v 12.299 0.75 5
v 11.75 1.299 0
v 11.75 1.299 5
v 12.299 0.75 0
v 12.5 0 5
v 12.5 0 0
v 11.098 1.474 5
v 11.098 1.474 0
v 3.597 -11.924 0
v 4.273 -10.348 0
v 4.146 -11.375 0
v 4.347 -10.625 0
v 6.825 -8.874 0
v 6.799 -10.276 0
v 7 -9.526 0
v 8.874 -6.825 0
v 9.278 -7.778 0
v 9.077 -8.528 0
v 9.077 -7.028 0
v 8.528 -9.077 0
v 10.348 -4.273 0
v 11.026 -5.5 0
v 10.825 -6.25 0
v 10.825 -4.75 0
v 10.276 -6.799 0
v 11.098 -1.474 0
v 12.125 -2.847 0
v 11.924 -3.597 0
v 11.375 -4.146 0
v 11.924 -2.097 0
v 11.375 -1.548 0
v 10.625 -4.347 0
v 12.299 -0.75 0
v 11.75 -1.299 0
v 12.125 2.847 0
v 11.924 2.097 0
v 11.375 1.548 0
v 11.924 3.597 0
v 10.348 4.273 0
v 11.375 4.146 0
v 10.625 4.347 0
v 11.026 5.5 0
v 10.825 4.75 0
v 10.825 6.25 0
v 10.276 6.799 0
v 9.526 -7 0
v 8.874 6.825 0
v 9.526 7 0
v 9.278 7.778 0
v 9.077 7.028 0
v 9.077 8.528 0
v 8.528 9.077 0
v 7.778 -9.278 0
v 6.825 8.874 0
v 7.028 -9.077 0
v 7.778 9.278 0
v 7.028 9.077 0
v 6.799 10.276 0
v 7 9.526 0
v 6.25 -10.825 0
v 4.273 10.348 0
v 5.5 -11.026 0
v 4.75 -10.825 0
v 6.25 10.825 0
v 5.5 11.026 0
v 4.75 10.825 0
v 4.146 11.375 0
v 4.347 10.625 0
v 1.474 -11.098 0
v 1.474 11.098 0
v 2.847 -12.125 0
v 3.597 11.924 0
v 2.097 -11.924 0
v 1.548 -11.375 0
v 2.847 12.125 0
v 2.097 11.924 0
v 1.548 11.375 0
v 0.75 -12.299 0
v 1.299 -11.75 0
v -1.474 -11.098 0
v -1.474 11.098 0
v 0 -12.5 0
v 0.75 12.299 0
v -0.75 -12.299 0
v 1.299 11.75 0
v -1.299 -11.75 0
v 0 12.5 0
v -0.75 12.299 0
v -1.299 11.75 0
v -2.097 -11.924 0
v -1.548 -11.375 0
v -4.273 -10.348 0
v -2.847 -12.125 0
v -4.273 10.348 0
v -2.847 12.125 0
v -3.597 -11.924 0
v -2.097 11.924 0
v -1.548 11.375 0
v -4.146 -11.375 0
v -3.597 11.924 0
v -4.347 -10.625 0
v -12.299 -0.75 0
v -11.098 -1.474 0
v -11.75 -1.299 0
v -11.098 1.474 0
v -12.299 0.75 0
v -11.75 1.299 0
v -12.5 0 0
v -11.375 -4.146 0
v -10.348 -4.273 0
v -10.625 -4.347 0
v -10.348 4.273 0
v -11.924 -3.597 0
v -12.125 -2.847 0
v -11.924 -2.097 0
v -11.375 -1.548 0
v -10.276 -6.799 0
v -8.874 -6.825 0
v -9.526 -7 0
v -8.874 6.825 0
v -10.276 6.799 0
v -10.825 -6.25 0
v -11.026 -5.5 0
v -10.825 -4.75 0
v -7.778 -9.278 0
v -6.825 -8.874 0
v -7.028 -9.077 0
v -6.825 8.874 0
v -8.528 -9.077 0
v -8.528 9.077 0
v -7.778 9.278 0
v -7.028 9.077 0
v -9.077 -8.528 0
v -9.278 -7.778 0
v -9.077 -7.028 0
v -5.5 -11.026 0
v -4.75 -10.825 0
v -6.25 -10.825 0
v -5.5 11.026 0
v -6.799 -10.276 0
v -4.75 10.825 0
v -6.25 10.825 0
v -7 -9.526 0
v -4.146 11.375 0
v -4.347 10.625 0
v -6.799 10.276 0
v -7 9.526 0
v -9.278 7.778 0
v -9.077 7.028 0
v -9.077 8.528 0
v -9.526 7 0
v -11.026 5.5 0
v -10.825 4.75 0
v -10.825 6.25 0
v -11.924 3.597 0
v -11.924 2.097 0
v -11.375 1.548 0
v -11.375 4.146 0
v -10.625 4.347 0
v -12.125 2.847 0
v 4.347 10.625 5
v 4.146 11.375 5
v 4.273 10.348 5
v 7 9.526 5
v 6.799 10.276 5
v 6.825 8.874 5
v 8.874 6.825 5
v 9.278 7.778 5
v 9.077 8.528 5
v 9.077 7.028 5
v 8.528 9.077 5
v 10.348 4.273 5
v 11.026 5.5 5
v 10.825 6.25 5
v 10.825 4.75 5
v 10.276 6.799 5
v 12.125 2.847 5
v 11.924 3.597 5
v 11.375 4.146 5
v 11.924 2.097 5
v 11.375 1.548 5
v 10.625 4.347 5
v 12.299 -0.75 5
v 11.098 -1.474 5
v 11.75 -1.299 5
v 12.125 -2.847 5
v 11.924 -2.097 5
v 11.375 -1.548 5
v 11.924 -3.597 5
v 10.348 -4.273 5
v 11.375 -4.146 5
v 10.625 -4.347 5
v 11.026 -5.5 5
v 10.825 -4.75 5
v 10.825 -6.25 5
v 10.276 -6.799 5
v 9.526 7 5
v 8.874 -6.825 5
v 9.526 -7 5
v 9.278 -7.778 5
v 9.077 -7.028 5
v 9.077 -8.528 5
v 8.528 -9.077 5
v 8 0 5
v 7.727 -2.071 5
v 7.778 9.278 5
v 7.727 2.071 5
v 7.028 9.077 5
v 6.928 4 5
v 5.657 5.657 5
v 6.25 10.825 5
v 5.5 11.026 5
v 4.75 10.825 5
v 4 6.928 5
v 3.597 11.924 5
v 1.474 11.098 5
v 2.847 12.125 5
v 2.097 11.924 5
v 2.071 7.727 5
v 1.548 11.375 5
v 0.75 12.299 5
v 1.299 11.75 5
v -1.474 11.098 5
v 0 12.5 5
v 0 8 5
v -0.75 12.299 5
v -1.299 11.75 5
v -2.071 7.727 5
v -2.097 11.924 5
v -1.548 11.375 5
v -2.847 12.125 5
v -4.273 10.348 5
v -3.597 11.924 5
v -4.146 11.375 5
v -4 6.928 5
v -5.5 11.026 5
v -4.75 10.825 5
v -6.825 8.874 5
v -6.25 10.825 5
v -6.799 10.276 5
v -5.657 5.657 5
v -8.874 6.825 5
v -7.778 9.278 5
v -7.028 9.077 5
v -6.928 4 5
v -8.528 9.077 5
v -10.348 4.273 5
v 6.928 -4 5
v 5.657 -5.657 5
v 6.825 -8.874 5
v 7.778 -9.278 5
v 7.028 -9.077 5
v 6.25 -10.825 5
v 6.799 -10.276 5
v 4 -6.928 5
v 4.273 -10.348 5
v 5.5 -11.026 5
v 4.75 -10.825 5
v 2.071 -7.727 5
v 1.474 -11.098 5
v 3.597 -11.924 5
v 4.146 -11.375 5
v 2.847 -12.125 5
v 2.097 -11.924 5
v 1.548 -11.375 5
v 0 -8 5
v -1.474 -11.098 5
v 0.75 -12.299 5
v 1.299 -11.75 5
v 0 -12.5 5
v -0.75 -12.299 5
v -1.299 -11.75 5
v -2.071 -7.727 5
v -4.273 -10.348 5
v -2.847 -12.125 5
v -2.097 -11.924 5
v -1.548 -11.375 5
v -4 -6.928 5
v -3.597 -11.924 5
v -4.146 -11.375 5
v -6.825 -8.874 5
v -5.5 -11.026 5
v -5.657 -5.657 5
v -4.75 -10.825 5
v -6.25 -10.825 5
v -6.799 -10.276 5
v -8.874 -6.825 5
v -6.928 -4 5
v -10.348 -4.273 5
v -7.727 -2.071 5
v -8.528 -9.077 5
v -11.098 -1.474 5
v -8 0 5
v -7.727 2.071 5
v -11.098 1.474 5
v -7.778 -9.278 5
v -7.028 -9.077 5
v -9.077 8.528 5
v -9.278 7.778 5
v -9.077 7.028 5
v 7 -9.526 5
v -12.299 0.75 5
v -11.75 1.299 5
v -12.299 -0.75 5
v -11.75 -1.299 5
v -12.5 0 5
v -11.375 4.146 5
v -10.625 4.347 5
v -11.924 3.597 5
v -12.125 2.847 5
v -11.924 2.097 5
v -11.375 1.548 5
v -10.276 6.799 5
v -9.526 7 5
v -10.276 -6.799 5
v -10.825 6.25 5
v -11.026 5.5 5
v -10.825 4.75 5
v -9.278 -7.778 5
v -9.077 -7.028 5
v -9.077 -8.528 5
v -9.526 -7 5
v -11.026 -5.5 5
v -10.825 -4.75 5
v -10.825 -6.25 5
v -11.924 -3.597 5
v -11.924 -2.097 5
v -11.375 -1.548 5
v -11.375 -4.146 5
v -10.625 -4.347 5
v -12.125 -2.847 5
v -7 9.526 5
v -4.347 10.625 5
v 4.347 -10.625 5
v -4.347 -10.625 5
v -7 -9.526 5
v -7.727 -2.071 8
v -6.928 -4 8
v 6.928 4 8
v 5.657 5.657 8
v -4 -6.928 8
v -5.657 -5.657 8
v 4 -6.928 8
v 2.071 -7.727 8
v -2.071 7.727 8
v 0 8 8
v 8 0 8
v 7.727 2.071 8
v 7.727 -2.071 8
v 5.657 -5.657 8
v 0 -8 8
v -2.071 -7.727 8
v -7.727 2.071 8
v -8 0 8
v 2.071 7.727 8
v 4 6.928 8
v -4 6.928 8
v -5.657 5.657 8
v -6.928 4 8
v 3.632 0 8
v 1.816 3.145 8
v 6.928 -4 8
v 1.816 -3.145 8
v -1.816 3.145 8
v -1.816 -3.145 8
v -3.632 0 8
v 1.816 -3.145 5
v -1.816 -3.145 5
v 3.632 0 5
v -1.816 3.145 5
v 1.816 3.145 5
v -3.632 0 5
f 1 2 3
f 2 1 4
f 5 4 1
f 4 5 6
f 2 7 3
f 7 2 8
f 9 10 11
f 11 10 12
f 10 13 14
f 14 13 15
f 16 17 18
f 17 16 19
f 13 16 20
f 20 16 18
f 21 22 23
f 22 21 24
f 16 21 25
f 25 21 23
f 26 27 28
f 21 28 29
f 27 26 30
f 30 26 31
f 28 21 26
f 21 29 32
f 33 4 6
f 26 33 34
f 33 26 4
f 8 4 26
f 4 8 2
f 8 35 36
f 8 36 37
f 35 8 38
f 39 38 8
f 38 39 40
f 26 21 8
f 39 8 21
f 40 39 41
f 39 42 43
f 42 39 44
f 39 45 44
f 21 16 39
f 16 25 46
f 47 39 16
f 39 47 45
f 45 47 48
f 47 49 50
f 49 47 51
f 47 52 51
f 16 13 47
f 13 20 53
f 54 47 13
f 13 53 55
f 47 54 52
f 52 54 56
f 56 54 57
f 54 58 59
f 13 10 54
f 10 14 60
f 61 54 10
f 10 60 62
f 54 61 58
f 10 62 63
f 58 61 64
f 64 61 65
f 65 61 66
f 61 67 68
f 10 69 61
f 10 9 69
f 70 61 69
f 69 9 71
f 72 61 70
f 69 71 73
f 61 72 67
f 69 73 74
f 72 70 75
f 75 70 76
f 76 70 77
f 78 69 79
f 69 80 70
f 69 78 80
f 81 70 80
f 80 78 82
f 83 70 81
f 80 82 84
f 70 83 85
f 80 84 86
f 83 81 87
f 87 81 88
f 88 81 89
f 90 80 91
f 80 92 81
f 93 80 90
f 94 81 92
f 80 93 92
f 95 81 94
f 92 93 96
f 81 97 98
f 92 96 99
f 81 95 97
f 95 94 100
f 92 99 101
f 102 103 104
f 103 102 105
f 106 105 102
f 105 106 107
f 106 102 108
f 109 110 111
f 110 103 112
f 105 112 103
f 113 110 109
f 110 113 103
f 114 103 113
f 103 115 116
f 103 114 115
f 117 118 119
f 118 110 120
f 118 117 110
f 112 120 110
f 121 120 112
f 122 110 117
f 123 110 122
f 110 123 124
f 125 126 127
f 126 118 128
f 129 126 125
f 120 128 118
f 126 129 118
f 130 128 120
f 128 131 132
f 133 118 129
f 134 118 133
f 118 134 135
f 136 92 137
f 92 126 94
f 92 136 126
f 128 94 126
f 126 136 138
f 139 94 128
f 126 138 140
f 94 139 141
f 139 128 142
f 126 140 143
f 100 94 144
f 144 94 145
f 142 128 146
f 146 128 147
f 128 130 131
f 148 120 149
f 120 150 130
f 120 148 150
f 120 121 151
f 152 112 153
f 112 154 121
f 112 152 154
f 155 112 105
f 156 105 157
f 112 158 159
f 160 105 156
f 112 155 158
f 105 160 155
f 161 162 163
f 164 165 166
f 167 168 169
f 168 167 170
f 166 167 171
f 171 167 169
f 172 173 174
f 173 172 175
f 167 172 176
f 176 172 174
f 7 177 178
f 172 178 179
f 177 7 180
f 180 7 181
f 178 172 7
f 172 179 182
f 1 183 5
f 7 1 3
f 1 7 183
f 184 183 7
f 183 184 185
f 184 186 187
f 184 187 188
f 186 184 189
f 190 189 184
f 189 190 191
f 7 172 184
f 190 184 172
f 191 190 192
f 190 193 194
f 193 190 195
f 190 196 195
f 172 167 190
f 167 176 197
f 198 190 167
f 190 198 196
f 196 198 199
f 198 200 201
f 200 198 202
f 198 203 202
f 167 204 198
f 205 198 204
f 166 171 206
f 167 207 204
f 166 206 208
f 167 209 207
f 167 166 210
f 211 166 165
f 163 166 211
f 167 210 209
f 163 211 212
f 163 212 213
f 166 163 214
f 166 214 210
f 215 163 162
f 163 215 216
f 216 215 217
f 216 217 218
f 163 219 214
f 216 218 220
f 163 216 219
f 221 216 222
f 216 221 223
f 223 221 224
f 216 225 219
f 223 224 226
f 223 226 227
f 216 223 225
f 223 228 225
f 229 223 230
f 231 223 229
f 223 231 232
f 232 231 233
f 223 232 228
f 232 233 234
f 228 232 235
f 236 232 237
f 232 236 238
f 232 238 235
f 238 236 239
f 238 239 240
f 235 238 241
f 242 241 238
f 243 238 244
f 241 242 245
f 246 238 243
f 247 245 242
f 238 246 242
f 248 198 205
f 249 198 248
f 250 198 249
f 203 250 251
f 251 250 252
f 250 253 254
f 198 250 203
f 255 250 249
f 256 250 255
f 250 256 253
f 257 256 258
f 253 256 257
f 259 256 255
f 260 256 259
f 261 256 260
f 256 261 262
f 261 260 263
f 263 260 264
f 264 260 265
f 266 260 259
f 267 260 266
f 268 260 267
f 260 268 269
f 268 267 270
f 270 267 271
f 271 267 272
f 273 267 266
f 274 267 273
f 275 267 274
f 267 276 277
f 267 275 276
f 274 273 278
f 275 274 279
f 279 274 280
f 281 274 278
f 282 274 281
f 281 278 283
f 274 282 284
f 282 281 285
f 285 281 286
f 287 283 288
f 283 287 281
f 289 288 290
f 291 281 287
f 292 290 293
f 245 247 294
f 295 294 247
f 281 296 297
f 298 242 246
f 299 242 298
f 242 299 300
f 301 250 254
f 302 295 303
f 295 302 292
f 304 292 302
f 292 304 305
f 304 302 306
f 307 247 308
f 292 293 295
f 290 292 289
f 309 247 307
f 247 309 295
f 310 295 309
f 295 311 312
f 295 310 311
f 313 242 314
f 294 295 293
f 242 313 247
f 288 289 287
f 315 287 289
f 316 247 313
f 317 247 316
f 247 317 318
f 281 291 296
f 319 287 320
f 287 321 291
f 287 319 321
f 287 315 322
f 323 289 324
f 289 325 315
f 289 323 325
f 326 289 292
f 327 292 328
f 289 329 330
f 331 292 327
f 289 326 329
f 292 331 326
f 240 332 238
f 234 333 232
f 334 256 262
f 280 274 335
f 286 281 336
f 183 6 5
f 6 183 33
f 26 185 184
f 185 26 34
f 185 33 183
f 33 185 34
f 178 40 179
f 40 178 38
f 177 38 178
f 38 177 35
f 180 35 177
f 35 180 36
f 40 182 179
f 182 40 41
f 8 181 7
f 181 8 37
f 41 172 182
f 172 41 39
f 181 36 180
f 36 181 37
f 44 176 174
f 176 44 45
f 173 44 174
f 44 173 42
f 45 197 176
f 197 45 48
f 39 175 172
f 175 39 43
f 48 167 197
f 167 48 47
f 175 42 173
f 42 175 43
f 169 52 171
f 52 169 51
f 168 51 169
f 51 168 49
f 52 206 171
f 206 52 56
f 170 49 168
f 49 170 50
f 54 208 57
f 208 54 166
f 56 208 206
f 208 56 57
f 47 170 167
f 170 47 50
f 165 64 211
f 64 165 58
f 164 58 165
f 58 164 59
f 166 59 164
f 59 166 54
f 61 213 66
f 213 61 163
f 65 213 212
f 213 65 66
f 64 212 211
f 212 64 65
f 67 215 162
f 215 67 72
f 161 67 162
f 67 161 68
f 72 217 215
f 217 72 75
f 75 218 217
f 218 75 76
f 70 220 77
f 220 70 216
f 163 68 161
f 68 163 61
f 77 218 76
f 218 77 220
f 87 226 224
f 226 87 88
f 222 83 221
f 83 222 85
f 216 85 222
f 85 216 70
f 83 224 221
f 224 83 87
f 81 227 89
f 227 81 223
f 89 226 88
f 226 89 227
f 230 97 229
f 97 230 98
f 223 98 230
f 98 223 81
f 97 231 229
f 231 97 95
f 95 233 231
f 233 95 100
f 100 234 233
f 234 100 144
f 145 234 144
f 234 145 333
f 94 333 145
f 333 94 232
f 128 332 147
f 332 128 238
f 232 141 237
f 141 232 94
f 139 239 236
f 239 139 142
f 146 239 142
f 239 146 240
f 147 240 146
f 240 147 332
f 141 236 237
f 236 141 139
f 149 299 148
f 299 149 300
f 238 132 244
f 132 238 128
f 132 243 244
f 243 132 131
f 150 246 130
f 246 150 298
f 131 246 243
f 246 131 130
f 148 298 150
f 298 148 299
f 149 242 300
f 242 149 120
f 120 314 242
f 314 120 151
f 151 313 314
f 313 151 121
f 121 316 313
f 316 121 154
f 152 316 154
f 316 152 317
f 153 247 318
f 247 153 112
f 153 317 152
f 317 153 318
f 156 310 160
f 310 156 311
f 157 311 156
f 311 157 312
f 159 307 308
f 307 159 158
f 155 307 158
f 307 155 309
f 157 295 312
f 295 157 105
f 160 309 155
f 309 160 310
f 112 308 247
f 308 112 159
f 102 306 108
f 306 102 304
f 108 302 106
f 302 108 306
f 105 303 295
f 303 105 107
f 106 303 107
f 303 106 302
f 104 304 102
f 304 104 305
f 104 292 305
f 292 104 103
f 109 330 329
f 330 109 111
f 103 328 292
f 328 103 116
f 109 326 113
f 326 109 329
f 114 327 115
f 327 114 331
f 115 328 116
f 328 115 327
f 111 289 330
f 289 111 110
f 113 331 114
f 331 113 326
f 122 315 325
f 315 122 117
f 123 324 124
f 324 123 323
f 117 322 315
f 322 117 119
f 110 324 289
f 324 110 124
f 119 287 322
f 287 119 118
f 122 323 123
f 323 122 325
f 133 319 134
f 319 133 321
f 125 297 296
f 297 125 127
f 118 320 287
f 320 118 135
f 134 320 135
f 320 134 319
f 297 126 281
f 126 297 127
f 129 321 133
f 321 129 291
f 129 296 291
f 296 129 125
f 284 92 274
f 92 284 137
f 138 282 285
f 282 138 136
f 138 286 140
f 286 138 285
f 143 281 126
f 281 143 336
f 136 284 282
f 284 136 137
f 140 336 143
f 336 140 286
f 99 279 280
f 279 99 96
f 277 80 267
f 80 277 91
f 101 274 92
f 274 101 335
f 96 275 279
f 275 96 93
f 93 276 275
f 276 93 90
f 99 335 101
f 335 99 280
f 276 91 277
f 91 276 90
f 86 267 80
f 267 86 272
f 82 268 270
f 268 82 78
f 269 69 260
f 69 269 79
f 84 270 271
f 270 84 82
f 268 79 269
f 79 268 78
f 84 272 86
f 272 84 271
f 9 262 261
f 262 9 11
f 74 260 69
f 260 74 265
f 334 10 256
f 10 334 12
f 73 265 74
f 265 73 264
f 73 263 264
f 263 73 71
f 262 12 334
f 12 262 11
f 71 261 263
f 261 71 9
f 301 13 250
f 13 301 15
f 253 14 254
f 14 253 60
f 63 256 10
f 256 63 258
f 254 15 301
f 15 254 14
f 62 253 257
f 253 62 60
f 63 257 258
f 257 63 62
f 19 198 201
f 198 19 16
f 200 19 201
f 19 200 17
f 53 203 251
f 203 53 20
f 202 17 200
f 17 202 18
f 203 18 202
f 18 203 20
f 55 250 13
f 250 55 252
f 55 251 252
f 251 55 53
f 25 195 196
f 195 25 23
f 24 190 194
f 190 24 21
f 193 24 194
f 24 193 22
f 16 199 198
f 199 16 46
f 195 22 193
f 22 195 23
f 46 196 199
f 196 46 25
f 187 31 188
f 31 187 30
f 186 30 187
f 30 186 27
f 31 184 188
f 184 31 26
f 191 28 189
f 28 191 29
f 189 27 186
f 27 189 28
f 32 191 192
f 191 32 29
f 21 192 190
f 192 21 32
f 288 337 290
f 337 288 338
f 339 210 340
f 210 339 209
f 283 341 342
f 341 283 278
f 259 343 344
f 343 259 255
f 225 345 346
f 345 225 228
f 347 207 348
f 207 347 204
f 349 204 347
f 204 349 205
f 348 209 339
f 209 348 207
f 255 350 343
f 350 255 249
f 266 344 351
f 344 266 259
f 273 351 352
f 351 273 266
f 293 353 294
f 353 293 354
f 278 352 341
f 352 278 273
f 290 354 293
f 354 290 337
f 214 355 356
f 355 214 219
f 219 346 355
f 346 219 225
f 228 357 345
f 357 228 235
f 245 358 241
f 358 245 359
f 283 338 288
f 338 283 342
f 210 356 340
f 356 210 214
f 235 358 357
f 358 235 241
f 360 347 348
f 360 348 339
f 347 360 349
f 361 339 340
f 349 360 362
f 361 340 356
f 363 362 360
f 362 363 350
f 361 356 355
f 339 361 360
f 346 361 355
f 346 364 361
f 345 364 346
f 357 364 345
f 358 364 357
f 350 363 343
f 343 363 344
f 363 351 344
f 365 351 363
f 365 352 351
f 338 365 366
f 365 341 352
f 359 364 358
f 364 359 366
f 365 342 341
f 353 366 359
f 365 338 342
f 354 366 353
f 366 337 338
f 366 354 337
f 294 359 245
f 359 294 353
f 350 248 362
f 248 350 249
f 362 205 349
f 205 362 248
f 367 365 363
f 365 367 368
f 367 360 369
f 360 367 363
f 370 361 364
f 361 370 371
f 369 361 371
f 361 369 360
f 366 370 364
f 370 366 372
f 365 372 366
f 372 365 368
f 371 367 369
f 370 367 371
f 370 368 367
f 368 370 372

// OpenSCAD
height = 8;
thick_height = 5;
diameter = 16;
thick_diameter = 22;

hole_diameter_tolerance = 0;
hole_diameter_base_size = 0;
nut_thickness = 3;
nut_width_tolerance = 0.35;
nut_width_base_size = 5.94;

module dummy() {}

hole_diameter = hole_diameter_base_size + hole_diameter_tolerance;
nut_width = nut_width_base_size + nut_width_tolerance;

nudge = 0.001;

pi = 3.141592653589793;

module knurledCylinder(h=10,r1=5,r2=1.5) {
    n = ceil(2 * pi * r1 / (2 * r2));
    cylinder(h=h,r=r1,$fn=n);
    for (i=[0:n-1]) {
        x = r1*cos(360./n*i);
        y = r1*sin(360./n*i);
        translate([x,y,0]) cylinder(h=h,r=r2,$fn=12);
    }
}

render(convexity=10)
difference() {
    union() {
        cylinder(h=height,r=diameter/2,$fn=24);
        knurledCylinder(h=thick_height,r1=thick_diameter/2);
    }
    translate([0,0,-nudge]) cylinder(h=height+2*nudge,d=hole_diameter,$fn=12);
    translate([0,0,height-nut_thickness])
    cylinder(h=nut_thickness+nudge,d=nut_width*2/sqrt(3), $fn=6);
}
